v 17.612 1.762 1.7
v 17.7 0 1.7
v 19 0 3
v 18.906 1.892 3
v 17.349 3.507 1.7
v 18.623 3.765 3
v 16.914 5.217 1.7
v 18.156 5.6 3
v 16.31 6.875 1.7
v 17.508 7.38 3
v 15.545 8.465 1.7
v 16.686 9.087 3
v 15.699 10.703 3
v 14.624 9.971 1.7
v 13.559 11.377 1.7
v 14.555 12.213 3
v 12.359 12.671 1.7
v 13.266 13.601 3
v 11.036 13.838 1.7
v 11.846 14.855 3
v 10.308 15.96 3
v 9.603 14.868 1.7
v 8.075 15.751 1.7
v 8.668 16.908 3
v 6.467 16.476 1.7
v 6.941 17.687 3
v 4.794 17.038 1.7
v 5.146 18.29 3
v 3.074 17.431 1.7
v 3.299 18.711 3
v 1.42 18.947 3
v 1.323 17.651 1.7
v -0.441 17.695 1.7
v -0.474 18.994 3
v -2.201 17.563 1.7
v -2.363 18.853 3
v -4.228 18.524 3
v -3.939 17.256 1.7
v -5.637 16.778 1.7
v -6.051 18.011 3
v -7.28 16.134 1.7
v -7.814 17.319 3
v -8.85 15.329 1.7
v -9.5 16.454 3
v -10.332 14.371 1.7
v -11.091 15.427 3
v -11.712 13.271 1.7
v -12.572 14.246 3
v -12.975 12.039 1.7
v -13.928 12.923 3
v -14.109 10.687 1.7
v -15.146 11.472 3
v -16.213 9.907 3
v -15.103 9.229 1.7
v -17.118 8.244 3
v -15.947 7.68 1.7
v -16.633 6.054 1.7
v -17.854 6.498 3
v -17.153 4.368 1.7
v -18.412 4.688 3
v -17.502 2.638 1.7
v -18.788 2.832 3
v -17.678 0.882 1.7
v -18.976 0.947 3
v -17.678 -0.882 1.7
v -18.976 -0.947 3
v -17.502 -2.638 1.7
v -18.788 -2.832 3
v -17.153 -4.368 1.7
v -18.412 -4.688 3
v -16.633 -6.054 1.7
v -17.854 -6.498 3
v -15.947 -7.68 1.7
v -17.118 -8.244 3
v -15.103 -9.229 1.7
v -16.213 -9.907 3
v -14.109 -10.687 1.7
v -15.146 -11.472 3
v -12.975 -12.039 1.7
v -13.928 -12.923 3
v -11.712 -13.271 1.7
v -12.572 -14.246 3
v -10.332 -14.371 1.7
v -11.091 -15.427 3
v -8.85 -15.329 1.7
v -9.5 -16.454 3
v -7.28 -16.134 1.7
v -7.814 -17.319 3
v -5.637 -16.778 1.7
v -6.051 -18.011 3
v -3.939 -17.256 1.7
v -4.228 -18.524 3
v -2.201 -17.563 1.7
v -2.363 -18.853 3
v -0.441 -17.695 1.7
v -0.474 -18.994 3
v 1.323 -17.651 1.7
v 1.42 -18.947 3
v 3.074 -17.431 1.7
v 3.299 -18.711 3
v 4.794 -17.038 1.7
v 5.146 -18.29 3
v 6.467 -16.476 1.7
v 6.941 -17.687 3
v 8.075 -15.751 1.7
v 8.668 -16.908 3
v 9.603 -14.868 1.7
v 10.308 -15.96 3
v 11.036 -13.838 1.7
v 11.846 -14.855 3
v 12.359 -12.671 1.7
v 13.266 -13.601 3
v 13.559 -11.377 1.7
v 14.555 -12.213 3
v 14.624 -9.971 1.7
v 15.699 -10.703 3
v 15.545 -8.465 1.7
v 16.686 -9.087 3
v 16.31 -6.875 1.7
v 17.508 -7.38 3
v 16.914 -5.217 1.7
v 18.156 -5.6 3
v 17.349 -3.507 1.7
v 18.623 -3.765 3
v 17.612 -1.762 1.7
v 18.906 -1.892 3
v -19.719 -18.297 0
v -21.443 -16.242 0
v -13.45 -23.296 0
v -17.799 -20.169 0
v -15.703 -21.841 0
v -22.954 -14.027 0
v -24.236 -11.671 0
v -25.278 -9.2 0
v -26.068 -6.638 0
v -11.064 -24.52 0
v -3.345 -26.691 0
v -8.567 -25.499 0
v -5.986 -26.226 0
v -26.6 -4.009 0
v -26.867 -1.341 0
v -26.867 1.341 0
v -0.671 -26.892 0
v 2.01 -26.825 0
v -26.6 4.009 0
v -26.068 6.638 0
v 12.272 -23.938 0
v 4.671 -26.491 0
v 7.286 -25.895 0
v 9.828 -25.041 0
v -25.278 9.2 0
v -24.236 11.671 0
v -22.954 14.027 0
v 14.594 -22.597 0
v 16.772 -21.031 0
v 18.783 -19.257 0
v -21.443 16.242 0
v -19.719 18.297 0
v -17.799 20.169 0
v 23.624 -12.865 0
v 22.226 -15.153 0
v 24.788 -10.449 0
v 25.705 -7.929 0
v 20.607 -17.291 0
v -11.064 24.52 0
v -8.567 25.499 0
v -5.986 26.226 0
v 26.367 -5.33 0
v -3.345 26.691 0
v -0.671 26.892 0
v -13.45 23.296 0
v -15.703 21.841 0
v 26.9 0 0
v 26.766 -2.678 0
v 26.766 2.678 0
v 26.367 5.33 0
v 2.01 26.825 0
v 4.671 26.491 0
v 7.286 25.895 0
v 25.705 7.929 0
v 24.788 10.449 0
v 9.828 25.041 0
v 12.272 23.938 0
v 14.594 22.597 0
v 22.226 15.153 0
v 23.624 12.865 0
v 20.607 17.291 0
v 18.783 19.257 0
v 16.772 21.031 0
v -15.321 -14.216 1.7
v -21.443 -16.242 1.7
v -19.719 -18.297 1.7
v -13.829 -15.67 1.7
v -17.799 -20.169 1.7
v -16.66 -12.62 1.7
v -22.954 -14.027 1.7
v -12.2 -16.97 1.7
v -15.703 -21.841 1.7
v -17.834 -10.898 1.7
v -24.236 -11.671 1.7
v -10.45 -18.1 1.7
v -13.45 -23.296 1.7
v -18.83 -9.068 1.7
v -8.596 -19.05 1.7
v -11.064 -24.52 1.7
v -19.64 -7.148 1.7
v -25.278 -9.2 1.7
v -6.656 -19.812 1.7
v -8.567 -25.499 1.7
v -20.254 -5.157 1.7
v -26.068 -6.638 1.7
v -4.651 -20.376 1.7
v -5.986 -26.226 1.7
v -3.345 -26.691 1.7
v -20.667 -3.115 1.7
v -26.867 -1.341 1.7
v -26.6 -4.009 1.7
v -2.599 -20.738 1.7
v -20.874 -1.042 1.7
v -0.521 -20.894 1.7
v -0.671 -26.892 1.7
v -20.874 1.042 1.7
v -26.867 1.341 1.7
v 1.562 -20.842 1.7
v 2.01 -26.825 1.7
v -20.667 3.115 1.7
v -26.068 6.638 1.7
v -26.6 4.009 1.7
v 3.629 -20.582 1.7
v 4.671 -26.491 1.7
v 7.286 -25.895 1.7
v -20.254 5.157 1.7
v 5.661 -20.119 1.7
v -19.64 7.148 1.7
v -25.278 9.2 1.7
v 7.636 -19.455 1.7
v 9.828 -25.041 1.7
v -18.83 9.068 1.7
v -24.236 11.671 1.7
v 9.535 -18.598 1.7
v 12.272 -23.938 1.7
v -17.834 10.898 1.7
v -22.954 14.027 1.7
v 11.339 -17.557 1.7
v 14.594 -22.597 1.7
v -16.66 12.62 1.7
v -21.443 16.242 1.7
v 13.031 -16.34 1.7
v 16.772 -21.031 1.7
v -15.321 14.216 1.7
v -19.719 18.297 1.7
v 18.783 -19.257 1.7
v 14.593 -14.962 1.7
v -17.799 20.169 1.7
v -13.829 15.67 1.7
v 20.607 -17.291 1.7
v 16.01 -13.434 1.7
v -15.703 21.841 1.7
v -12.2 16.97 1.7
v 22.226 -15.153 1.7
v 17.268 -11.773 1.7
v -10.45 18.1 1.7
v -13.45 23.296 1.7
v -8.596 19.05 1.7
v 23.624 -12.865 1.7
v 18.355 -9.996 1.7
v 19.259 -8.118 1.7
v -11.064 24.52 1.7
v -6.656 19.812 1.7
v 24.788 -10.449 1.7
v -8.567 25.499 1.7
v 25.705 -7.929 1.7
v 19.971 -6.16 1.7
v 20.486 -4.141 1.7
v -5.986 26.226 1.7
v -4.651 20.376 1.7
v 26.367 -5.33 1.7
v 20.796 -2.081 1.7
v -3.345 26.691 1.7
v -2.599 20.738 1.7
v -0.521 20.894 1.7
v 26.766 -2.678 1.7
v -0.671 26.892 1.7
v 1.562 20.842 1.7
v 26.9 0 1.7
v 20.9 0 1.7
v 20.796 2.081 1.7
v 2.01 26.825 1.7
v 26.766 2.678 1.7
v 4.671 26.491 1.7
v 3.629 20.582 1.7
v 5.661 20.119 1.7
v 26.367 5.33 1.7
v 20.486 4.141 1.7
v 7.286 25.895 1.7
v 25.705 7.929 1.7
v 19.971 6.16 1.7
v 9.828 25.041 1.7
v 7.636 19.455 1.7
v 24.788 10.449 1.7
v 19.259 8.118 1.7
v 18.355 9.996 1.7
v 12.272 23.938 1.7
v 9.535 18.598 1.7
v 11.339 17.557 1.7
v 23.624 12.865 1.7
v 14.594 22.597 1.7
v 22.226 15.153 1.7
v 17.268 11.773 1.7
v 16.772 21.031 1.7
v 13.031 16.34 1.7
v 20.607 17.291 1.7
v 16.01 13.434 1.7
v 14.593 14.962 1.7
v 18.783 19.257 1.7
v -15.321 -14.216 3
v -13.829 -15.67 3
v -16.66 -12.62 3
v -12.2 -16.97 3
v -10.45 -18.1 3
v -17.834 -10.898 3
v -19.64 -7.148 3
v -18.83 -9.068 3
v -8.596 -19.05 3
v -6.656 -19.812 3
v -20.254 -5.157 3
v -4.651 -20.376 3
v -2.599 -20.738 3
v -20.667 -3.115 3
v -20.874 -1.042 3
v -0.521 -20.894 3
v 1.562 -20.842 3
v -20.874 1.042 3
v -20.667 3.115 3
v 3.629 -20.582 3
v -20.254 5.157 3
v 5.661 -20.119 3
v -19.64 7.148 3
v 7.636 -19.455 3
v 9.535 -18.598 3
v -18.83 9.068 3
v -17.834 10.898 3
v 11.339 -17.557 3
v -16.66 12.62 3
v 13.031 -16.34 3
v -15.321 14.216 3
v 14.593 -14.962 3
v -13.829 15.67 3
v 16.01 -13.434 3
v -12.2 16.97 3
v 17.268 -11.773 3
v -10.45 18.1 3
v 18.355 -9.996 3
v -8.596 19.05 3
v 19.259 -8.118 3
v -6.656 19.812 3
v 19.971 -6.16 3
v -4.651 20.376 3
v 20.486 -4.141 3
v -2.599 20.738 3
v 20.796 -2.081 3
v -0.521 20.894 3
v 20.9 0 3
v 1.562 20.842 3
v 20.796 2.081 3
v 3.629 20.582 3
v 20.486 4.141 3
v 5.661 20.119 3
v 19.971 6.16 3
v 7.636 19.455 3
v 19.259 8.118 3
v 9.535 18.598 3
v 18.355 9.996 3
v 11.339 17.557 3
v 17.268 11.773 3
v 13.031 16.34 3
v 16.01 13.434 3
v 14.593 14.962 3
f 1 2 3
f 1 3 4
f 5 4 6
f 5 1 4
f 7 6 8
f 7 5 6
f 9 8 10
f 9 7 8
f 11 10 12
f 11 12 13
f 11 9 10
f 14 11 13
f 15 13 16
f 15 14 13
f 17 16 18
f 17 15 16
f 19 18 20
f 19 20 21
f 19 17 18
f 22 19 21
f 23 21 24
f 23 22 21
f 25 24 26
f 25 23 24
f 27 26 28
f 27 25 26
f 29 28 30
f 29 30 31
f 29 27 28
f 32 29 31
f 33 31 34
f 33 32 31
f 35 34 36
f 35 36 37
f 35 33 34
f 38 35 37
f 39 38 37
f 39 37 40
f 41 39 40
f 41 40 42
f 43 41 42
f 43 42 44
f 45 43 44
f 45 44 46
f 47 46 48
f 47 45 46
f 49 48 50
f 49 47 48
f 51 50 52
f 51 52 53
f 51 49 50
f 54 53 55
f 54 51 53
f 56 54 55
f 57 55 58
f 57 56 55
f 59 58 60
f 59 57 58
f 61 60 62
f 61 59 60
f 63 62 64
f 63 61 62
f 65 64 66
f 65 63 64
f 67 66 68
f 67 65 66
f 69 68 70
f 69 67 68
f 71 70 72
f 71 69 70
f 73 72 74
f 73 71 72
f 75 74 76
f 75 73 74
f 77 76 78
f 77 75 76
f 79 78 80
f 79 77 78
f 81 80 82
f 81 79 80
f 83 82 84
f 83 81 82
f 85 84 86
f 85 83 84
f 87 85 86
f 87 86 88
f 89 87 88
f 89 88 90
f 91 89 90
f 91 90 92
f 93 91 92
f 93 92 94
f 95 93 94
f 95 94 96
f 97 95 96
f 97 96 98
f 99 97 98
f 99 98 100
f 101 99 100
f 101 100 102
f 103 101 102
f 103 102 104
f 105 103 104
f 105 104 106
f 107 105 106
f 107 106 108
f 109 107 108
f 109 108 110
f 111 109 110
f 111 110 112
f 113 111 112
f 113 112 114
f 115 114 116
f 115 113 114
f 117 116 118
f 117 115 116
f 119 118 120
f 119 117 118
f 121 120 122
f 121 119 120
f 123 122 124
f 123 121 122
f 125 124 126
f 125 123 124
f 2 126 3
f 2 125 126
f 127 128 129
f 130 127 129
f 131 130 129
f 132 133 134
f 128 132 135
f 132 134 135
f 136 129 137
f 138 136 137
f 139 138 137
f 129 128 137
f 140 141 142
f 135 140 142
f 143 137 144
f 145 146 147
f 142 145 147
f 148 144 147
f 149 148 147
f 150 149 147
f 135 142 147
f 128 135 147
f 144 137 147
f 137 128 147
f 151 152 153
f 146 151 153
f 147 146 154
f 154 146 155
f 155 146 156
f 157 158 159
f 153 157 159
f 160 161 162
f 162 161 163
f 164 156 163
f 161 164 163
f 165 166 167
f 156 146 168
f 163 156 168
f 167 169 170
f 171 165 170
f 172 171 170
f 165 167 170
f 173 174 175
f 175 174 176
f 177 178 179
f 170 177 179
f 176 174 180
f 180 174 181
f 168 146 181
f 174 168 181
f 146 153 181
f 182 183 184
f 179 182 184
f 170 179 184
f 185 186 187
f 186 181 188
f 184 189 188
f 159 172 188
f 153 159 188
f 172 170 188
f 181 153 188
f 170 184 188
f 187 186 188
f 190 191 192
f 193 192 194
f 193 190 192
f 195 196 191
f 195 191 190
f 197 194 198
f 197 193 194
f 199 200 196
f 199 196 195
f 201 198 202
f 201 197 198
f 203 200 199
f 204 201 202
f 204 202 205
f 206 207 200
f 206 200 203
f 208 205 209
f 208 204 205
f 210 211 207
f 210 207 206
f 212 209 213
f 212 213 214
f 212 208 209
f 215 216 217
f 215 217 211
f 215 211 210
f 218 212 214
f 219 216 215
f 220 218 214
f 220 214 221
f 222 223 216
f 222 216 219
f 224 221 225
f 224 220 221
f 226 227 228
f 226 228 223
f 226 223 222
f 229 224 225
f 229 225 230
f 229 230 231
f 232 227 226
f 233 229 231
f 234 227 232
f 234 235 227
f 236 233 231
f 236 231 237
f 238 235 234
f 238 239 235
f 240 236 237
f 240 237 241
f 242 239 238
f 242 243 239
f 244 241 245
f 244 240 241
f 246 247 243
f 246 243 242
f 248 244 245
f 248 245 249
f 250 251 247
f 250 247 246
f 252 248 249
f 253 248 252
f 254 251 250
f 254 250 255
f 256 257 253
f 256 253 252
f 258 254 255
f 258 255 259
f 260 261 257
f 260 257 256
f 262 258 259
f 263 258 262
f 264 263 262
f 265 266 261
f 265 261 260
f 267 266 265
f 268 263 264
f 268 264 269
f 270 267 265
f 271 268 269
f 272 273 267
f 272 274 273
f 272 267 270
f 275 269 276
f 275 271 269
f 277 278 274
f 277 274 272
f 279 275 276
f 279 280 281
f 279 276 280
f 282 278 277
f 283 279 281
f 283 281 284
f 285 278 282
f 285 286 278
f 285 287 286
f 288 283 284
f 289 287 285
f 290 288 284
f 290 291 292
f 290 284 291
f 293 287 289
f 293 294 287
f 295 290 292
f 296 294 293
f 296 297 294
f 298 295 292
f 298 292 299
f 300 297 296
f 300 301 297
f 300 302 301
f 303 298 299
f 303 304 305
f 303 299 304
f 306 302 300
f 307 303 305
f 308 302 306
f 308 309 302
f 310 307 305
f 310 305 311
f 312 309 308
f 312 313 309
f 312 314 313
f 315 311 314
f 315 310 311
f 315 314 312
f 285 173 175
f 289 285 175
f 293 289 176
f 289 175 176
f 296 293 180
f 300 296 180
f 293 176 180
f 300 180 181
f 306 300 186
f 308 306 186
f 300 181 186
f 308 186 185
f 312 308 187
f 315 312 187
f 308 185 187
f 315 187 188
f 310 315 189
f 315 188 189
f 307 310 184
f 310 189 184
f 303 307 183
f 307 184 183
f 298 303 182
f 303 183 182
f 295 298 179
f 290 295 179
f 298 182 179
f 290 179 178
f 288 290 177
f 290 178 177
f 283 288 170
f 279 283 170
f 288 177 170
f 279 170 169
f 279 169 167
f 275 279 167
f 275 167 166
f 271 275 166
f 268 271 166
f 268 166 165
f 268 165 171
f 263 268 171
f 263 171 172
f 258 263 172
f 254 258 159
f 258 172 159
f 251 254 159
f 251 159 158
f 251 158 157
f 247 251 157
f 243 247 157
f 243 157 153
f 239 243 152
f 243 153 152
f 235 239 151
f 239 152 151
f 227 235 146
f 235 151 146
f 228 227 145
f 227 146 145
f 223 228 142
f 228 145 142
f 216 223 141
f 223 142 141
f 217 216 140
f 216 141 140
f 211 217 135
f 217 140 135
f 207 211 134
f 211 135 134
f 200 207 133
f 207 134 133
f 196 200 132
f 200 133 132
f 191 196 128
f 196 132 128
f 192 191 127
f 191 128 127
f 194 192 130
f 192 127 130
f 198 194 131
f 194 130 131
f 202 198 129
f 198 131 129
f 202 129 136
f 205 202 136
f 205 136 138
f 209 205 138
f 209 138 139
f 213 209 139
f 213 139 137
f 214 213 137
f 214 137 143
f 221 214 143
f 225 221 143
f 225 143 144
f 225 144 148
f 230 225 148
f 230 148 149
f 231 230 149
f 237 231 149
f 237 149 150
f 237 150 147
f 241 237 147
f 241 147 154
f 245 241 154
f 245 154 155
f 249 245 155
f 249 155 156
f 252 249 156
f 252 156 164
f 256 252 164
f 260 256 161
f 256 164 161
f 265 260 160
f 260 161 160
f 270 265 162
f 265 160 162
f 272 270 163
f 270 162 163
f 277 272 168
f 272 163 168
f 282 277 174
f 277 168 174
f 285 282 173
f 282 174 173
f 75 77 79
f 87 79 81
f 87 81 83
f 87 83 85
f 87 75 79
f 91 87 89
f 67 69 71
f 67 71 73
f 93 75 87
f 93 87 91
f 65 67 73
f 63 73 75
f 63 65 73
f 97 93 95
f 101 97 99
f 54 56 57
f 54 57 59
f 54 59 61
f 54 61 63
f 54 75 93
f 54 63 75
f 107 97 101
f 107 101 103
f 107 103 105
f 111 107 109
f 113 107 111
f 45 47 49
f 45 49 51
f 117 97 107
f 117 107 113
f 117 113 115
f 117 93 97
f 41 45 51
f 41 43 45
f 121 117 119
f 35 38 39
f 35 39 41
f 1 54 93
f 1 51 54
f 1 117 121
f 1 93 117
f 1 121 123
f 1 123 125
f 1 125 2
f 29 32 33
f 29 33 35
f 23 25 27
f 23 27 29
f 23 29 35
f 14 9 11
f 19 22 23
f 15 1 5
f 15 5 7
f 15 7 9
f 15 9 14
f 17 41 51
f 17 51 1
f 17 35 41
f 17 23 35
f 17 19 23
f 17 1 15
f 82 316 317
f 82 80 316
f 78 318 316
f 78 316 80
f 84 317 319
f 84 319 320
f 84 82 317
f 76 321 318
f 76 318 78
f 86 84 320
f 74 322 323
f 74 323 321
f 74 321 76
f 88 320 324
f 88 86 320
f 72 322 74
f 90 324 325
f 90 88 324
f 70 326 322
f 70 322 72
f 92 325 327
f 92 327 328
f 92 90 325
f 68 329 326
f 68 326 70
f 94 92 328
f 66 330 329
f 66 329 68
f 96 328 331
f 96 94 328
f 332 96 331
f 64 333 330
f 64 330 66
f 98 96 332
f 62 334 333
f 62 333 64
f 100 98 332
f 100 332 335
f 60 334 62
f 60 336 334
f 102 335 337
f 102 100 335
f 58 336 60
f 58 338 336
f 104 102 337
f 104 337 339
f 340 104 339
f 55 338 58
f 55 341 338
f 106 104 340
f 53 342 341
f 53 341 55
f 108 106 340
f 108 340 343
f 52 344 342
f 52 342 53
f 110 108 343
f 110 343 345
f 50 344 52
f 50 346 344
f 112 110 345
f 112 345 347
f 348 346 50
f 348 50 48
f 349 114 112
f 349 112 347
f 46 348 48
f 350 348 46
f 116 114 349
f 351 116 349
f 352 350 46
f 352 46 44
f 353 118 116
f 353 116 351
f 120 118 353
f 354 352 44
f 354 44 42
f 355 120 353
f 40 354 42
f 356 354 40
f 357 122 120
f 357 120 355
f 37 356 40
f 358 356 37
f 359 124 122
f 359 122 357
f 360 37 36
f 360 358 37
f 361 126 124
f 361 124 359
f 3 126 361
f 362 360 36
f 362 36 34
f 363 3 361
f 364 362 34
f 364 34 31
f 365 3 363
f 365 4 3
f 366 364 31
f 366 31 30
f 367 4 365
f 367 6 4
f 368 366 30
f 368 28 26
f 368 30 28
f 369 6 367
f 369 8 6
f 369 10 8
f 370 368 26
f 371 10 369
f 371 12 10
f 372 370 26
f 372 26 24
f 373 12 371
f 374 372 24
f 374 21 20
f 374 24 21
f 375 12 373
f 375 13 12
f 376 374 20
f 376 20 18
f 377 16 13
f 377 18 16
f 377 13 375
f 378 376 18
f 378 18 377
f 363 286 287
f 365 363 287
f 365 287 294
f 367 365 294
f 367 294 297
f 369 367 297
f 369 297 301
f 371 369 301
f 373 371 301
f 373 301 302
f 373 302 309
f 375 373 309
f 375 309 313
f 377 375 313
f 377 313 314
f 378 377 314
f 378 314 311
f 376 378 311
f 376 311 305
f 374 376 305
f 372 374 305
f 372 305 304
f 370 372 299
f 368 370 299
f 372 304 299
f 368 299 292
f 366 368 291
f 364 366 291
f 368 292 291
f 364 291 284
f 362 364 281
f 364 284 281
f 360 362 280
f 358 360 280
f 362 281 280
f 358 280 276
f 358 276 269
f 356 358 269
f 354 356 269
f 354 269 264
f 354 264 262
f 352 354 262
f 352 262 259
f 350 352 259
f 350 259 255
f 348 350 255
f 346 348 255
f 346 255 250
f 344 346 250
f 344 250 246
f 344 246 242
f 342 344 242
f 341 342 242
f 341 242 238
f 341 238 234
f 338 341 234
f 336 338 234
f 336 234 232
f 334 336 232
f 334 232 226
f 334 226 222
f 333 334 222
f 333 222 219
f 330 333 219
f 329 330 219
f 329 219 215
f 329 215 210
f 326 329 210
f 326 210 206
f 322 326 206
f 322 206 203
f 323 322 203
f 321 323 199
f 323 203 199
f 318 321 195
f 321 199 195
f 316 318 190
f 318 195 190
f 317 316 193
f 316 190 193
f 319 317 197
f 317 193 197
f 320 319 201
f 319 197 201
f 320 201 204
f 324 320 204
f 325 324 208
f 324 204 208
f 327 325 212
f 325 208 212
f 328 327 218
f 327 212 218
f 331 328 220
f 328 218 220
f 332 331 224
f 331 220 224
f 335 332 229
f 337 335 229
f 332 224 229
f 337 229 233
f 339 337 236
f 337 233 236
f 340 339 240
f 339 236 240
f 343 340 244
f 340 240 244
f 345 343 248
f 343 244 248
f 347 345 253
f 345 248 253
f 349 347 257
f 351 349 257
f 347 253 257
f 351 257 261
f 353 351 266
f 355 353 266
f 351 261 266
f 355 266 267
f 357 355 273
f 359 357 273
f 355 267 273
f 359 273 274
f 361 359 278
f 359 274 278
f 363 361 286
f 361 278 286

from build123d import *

# Parameters (mm, degrees)
F0_R     = 26.9
F0_R_2   = 20.9
F1_DEPTH = 1.7
F2_DEPTH = 3
F3_R     = 19
F4_DEPTH = 1.3
F5_SIZE  = 1.29999


# Not quite as in the source:
# - a fillet or chamfer is up to 0.001 mm smaller than in the source, because OpenCascade refuses the exact size


with BuildPart() as f1:
    # F0 (on Top) → F1 (new body)
    with BuildSketch(Plane.XY):
        Circle(F0_R)
        Circle(F0_R_2, mode=Mode.SUBTRACT)
    extrude(amount=F1_DEPTH)

    # F0 (on Top) → F2 (join)
    with BuildSketch(Plane.XY):
        Circle(F0_R_2)
    extrude(amount=F2_DEPTH)

    # F3 (on face) → F4 (cut)
    with BuildSketch(Plane.XY.offset(3)):
        Circle(F3_R)
    extrude(amount=-F4_DEPTH, mode=Mode.SUBTRACT)

    # F5 (size 1.3 in the source; OpenCascade refuses exactly that, so slightly less here)
    f5_edges = [f1.edges().sort_by_distance(p)[0] for p in [
        (-19, 0, 1.7),
    ]]
    chamfer(f5_edges, length=F5_SIZE)


solid = f1.part
